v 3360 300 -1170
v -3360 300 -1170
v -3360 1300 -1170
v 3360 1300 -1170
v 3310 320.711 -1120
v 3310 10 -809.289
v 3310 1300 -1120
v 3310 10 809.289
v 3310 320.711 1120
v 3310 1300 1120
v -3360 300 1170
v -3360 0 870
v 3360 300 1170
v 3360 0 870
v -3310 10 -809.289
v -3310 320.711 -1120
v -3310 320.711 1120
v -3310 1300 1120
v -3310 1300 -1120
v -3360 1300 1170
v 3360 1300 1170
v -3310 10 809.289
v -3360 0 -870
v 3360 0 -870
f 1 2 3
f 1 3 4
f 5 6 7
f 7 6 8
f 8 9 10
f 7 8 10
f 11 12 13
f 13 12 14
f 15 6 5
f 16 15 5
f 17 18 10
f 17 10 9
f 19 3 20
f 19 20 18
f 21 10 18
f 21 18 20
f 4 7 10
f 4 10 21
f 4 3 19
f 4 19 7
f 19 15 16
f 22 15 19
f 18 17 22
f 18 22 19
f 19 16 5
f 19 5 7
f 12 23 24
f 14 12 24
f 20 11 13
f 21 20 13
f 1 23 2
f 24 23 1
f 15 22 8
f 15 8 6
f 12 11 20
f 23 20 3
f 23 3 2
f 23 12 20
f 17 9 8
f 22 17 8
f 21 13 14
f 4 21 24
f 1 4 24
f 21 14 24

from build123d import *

# Parameters (mm, degrees)
SKETCH1_W           = 6720
SKETCH1_H           = 2340
BOSS_EXTRUDE1_DEPTH = 1300
CHAMFER1_SIZE       = 300
SHELL1_START        = -3310
SHELL1_DEPTH        = 6620


# Read off the part's stored shape, not the designer's step: Shell1
with BuildPart() as part:
    # Sketch1 → Boss-Extrude1 (new body)
    with BuildSketch(Plane(origin=(0, 0, 0), x_dir=(1, 0, 0), z_dir=(0, 1, 0))):
        Rectangle(SKETCH1_W, SKETCH1_H)
    extrude(amount=BOSS_EXTRUDE1_DEPTH)

    # Chamfer1
    chamfer1_edges = [part.edges().sort_by_distance(p)[0] for p in [
        (0, 0, 1170),
        (0, 0, -1170),
    ]]
    chamfer(chamfer1_edges, length=CHAMFER1_SIZE)

    # Shell1 outline → Shell1 (cut)
    with BuildSketch(Plane.YZ.offset(SHELL1_START)):
        Polygon((320.710678119, -1120), (1300, -1120), (1300, 1120), (320.710678119, 1120), (10, 809.289321881), (10, -809.289321881), align=None)
    extrude(amount=SHELL1_DEPTH, mode=Mode.SUBTRACT)


solid = part.part
